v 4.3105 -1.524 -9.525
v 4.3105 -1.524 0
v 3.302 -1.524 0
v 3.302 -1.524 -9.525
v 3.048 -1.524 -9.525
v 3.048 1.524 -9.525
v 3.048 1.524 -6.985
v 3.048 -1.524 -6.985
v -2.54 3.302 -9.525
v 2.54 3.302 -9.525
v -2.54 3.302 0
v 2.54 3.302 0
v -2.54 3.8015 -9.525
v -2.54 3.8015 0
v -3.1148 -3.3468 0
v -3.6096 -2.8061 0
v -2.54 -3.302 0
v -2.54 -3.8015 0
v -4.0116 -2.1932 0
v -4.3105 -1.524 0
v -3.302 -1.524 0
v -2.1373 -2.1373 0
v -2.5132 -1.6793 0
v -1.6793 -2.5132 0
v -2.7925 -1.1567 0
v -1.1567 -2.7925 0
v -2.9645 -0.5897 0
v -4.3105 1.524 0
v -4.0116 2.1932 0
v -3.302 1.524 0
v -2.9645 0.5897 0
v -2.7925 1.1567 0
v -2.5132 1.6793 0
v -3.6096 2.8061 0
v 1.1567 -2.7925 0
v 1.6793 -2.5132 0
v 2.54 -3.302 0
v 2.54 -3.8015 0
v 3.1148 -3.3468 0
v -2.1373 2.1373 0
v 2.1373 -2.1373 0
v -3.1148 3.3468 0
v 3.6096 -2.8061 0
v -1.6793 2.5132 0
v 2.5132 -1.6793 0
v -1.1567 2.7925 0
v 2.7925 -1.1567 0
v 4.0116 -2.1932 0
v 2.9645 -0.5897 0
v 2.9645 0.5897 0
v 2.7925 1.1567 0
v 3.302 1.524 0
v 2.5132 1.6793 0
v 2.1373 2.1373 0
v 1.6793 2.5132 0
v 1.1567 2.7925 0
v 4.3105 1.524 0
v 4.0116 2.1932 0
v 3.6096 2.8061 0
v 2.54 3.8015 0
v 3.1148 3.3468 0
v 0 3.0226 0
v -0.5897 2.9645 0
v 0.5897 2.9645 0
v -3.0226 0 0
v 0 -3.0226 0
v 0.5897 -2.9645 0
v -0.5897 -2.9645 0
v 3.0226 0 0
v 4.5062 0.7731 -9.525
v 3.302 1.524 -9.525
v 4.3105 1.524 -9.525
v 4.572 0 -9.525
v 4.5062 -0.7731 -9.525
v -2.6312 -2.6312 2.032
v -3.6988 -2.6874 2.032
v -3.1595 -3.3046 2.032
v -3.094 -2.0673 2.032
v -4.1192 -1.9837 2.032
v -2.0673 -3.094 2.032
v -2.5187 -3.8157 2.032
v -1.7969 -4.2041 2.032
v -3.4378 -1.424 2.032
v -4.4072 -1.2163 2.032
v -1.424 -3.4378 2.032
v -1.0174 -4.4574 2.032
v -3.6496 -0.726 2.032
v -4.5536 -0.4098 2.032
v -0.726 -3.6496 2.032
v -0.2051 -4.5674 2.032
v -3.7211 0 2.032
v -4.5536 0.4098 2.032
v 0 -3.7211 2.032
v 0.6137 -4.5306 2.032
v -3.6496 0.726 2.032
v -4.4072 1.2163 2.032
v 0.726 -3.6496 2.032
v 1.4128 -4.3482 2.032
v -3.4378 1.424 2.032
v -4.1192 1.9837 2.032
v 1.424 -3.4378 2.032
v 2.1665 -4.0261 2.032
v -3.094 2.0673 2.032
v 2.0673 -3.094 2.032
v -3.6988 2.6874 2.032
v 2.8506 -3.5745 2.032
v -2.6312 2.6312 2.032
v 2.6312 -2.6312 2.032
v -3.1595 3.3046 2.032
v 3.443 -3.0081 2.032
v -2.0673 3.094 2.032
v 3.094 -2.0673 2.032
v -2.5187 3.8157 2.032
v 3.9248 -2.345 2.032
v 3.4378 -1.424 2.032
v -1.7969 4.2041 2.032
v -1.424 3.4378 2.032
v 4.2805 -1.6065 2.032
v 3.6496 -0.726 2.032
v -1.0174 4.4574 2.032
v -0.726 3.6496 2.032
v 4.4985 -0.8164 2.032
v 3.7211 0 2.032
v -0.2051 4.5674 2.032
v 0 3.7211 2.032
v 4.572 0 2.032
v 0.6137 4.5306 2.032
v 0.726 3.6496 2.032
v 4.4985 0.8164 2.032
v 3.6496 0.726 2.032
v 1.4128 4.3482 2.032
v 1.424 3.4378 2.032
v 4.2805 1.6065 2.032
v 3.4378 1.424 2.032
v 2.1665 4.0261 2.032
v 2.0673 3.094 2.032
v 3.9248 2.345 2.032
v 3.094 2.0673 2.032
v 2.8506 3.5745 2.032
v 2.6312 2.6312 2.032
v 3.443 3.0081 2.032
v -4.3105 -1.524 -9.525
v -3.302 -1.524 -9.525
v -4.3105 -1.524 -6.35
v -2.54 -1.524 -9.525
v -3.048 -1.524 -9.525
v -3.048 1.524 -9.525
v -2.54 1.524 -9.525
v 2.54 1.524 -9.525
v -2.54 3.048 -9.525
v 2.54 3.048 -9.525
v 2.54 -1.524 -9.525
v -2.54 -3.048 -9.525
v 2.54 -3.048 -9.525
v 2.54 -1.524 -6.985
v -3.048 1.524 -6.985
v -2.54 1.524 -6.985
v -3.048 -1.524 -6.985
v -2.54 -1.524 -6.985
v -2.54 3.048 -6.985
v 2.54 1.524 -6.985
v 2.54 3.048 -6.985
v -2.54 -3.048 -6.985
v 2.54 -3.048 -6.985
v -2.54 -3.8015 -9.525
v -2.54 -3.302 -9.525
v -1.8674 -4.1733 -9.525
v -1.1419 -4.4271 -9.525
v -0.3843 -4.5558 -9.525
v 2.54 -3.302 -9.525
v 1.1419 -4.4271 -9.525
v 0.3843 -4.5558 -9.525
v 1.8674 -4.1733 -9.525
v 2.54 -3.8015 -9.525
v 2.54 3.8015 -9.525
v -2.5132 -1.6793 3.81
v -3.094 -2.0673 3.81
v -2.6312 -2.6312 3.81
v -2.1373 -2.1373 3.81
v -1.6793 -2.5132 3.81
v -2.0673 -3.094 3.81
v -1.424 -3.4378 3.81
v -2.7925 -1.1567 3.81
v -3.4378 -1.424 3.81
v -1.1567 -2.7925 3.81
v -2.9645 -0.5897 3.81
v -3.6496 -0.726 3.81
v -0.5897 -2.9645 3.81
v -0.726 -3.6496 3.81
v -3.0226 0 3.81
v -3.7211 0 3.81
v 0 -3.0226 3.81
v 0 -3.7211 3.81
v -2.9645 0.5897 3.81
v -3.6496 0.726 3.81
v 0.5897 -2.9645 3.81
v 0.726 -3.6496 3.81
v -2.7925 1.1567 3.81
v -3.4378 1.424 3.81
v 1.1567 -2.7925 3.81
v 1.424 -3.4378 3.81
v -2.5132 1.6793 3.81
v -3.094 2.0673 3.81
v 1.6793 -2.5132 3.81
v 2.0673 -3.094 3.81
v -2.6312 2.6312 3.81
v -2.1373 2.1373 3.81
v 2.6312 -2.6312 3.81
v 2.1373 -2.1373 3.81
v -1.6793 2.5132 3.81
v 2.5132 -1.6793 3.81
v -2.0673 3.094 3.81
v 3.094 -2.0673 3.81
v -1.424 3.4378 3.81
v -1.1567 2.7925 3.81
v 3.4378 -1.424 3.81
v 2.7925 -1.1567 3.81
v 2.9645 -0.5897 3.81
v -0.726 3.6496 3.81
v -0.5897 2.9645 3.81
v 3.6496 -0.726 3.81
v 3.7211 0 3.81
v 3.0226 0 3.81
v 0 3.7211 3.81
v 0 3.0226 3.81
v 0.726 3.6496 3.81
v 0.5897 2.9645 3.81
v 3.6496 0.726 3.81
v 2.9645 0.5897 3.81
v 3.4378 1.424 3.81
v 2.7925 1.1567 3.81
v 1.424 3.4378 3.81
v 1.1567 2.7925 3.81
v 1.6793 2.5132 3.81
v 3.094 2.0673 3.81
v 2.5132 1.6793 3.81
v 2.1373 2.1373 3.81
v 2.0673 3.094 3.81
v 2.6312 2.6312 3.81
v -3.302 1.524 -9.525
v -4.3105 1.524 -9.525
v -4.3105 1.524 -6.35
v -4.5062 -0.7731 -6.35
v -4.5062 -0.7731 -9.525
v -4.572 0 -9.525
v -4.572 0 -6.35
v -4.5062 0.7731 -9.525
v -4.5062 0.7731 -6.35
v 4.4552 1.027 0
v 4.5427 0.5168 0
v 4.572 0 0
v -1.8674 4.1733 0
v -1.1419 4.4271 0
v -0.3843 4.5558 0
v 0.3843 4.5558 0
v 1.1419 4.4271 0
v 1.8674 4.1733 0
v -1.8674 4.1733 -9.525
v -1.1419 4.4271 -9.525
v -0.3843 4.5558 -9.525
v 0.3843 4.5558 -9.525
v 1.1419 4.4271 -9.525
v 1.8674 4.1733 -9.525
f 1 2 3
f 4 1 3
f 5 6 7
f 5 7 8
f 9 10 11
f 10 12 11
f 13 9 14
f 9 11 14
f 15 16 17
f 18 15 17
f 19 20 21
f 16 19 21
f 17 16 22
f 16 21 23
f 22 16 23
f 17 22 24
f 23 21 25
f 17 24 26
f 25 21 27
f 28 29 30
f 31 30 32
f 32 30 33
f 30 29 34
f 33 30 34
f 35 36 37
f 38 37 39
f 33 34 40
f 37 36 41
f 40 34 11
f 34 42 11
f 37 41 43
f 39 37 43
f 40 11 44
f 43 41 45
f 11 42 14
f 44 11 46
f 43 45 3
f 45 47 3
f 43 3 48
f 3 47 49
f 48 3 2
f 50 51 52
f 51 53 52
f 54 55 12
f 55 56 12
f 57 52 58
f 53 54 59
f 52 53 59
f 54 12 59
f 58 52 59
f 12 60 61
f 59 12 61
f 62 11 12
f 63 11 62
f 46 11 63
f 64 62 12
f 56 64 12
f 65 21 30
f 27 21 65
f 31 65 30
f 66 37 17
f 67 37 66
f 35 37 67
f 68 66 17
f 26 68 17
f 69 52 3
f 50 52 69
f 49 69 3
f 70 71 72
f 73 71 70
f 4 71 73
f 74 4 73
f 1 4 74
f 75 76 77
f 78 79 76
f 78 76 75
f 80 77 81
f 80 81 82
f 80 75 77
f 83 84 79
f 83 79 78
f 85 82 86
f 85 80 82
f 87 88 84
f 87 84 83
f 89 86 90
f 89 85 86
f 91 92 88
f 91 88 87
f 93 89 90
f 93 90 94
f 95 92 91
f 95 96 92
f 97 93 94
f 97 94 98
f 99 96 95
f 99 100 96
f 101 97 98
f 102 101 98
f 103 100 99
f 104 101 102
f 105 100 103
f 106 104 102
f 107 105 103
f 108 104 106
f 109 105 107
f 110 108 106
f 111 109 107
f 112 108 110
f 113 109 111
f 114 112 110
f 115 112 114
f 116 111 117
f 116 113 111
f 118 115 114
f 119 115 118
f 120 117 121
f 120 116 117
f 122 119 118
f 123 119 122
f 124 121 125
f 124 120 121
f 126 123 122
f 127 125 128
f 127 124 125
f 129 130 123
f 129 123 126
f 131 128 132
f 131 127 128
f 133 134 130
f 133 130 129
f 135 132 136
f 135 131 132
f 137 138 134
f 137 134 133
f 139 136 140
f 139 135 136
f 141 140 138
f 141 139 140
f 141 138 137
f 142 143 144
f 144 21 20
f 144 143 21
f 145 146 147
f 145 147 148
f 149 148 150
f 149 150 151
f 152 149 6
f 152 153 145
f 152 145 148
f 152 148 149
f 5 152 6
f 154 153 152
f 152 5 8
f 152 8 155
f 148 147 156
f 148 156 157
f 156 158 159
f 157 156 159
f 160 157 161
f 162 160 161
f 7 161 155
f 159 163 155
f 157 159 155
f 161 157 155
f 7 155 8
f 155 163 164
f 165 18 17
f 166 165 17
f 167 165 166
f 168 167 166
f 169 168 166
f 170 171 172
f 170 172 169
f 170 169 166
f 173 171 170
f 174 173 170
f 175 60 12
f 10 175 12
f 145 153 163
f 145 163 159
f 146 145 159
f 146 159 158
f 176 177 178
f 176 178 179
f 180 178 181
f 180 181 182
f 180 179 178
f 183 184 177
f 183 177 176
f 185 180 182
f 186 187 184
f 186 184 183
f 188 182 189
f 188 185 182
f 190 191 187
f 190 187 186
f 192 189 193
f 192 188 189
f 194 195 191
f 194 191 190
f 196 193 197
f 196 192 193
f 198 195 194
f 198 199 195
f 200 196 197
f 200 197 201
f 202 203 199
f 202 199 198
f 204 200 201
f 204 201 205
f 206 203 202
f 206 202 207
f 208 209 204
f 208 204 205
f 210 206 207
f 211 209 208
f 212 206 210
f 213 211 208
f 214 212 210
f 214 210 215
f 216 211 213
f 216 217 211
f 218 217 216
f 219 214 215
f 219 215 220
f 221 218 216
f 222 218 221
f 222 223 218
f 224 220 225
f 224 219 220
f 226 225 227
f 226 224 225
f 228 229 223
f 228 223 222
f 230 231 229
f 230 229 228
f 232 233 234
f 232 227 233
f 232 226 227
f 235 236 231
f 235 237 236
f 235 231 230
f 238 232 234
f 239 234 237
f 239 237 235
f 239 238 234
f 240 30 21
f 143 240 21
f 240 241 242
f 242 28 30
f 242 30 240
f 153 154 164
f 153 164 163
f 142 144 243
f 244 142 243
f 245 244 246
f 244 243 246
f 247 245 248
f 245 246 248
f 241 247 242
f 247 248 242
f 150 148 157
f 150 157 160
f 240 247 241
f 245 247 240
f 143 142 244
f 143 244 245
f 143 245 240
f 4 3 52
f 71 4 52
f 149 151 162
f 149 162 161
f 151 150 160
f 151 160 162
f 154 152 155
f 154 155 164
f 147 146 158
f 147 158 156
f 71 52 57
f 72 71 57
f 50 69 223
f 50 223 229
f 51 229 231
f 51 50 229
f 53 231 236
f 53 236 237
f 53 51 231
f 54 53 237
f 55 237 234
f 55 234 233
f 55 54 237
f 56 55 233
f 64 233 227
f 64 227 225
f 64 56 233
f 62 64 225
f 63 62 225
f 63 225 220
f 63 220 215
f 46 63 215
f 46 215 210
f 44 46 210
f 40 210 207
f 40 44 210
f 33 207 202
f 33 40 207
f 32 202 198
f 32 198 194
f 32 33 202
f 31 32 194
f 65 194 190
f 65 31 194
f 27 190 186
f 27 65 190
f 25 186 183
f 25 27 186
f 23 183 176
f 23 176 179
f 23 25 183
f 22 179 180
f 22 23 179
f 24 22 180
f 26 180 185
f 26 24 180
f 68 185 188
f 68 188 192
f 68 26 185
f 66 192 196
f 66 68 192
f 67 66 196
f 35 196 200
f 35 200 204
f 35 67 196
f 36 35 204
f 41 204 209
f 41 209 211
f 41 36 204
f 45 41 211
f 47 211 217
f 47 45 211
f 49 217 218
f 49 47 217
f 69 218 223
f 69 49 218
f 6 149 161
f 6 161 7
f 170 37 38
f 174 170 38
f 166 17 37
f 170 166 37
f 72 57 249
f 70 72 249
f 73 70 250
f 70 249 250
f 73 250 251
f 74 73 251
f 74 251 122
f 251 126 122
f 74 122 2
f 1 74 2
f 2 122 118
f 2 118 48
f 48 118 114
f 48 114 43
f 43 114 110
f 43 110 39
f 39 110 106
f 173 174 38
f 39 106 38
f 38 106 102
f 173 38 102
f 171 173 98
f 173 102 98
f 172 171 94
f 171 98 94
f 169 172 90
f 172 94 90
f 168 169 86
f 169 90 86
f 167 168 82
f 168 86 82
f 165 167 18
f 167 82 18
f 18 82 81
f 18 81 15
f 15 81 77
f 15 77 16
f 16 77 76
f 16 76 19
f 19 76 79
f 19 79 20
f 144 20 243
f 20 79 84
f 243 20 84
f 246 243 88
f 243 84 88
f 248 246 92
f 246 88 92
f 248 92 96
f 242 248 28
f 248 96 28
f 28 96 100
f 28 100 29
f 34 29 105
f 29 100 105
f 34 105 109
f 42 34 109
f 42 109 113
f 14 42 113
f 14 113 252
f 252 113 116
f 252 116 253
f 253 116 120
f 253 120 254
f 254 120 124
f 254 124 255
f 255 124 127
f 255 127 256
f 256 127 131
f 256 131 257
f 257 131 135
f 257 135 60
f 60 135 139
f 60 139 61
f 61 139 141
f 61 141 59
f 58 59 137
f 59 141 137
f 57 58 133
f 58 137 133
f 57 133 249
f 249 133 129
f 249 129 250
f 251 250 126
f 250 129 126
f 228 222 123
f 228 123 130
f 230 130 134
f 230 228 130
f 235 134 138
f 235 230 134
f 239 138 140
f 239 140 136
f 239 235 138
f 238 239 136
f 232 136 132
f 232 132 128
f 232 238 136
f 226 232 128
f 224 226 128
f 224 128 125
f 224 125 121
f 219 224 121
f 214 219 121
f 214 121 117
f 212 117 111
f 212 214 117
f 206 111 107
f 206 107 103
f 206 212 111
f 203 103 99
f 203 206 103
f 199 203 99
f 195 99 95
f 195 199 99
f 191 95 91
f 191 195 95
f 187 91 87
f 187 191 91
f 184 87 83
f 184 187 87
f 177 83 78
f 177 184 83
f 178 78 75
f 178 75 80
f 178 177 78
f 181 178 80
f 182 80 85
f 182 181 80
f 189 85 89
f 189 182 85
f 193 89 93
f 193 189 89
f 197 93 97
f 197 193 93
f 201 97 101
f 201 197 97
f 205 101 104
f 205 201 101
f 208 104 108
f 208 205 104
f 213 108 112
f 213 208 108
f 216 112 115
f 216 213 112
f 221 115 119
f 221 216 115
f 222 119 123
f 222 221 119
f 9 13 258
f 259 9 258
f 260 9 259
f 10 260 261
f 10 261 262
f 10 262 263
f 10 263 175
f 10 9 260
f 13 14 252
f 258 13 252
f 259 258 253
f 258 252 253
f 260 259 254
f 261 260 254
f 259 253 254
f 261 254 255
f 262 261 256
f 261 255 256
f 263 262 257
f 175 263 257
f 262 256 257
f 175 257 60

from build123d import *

# Parameters (mm, degrees)
F0_R      = 4.572
F0_R_2    = 3.0226
F1_DEPTH  = 3.81
F2_R      = 4.572
F2_R_2    = 3.7211
F3_DEPTH  = 1.778
F5_DEPTH  = 6.35
F6_DEPTH  = 3.175
F8_DEPTH  = 2.54
F11_DEPTH = 6.35
F13_DEPTH = 3.175
F14_R     = 4.8244158916
F15_DEPTH = 3.175


# Not quite as in the source:
# - after a boolean that leaves OpenCascade's solid faulty, fix() repairs it


with BuildPart() as f1:
    # F0 (on Top) → F1 (new body)
    with BuildSketch(Plane.XY):
        Circle(F0_R)
        Circle(F0_R_2, mode=Mode.SUBTRACT)
    extrude(amount=F1_DEPTH)

    # F2 (on face) → F3 (cut)
    with BuildSketch(Plane.XY.offset(3.81)):
        Circle(F2_R)
        Circle(F2_R_2, mode=Mode.SUBTRACT)
    extrude(amount=-F3_DEPTH, mode=Mode.SUBTRACT)

    # F4 (on face) → F5 (join)
    with BuildSketch(Plane(origin=(0, 0, 0), x_dir=(1, 0, 0), z_dir=(0, 0, -1))):
        with BuildLine():
            Line((-3.302, 1.524), (-4.3105229381, 1.524))
            ThreePointArc((-4.3105229381, 1.524), (-4.572, 0), (-4.3105229381, -1.524))
            Line((-4.3105229381, -1.524), (-3.302, -1.524))
            Line((-3.302, -1.524), (-3.302, 1.524))
        make_face()
        with BuildLine():
            Line((-2.54, 3.302), (2.54, 3.302))
            Line((2.54, 3.302), (2.54, 3.801523905))
            ThreePointArc((2.54, 3.801523905), (0, 4.572), (-2.54, 3.801523905))
            Line((-2.54, 3.801523905), (-2.54, 3.302))
        make_face()
        with BuildLine():
            Line((4.3105229381, 1.524), (3.302, 1.524))
            Line((3.302, 1.524), (3.302, -1.524))
            Line((3.302, -1.524), (4.3105229381, -1.524))
            ThreePointArc((4.3105229381, -1.524), (4.572, 0), (4.3105229381, 1.524))
        make_face()
        with BuildLine():
            Line((2.54, -3.801523905), (2.54, -3.302))
            Line((2.54, -3.302), (-2.54, -3.302))
            Line((-2.54, -3.302), (-2.54, -3.801523905))
            ThreePointArc((-2.54, -3.801523905), (0, -4.572), (2.54, -3.801523905))
        make_face()
    extrude(amount=F5_DEPTH)

    add(f1.part.fix(), mode=Mode.REPLACE)

    # F6 (add): faces of the model
    f6_faces = [f1.faces().sort_by_distance(p)[0] for p in [
        (0, 3.838335495, -6.35),
        (0, -3.838335495, -6.35),
        (-3.8964762164, 0, -6.35),
        (3.8964762164, 0, -6.35),
    ]]
    extrude(f6_faces, amount=F6_DEPTH)


with BuildPart() as f8:
    # F7 (on face) → F8 (new body)
    with BuildSketch(Plane(origin=(0, 0, -9.525), x_dir=(1, 0, 0), z_dir=(0, 0, -1))):
        Polygon((-2.54, 1.524), (-3.048, 1.524), (-3.048, -1.524), (-2.54, -1.524), (-2.54, -3.048), (2.54, -3.048), (2.54, -1.524), (3.048, -1.524), (3.048, 1.524), (2.54, 1.524), (2.54, 3.048), (-2.54, 3.048), align=None)
    extrude(amount=-F8_DEPTH)


with BuildPart() as f11:
    # F10 (on offset) → F11 (new body)
    with BuildSketch(Plane.XY.offset(-25.4)):
        with BuildLine():
            Line((-6.5659403285, 8.1975422484), (-4.0371337642, 3.8175207966))
            ThreePointArc((-4.0371337642, 3.8175207966), (-5.55625, 0), (-4.0371337642, -3.8175207966))
            Line((-4.0371337642, -3.8175207966), (-6.5659403285, -8.1975422484))
            Line((-6.5659403285, -8.1975422484), (-3.8163096715, -9.7850422484))
            Line((-3.8163096715, -9.7850422484), (-1.2875031072, -5.4050207966))
            ThreePointArc((-1.2875031072, -5.4050207966), (2.778125, -4.8118536498), (5.3246368714, -1.5875))
            Line((5.3246368714, -1.5875), (10.38225, -1.5875))
            Line((10.38225, -1.5875), (10.38225, 1.5875))
            Line((10.38225, 1.5875), (5.3246368714, 1.5875))
            ThreePointArc((5.3246368714, 1.5875), (2.778125, 4.8118536498), (-1.2875031072, 5.4050207966))
            Line((-1.2875031072, 5.4050207966), (-3.8163096715, 9.7850422484))
            Line((-3.8163096715, 9.7850422484), (-6.5659403285, 8.1975422484))
        make_face()
        with BuildLine():
            ThreePointArc((2.794, -3.9330080976), (0, -4.8244158916), (-2.794, -3.9330080976))
            Line((-2.794, -3.9330080976), (-2.794, -2.794))
            Line((-2.794, -2.794), (2.794, -2.794))
            Line((2.794, -2.794), (2.794, -3.9330080976))
        make_face(mode=Mode.SUBTRACT)
        with BuildLine():
            Line((-4.4850030606, 1.7775646942), (-2.7929016728, 1.7775646942))
            Line((-2.7929016728, 1.7775646942), (-2.7929016728, -1.7775646942))
            Line((-2.7929016728, -1.7775646942), (-4.4850030606, -1.7775646942))
            ThreePointArc((-4.4850030606, -1.7775646942), (-4.8244158916, 0), (-4.4850030606, 1.7775646942))
        make_face(mode=Mode.SUBTRACT)
        with BuildLine():
            Line((2.794, 2.794), (-2.794, 2.794))
            Line((-2.794, 2.794), (-2.794, 3.9330080976))
            ThreePointArc((-2.794, 3.9330080976), (0, 4.8244158916), (2.794, 3.9330080976))
            Line((2.794, 3.9330080976), (2.794, 2.794))
        make_face(mode=Mode.SUBTRACT)
        with BuildLine():
            Line((4.4850030606, -1.7775646942), (2.7929016728, -1.7775646942))
            Line((2.7929016728, -1.7775646942), (2.7929016728, 1.7775646942))
            Line((2.7929016728, 1.7775646942), (4.4850030606, 1.7775646942))
            ThreePointArc((4.4850030606, 1.7775646942), (4.8244158916, 0), (4.4850030606, -1.7775646942))
        make_face(mode=Mode.SUBTRACT)
    extrude(amount=F11_DEPTH)

    # F12 (on face) → F13 (join)
    with BuildSketch(Plane.XY.offset(-19.05)):
        with BuildLine():
            Line((10.38225, -1.5875), (10.38225, 1.5875))
            Line((10.38225, 1.5875), (5.3246368714, 1.5875))
            ThreePointArc((5.3246368714, 1.5875), (2.778125, 4.8118536498), (-1.2875031072, 5.4050207966))
            Line((-1.2875031072, 5.4050207966), (-3.8163096715, 9.7850422484))
            Line((-3.8163096715, 9.7850422484), (-6.5659403285, 8.1975422484))
            Line((-6.5659403285, 8.1975422484), (-4.0371337642, 3.8175207966))
            ThreePointArc((-4.0371337642, 3.8175207966), (-5.55625, 0), (-4.0371337642, -3.8175207966))
            Line((-4.0371337642, -3.8175207966), (-6.5659403285, -8.1975422484))
            Line((-6.5659403285, -8.1975422484), (-3.8163096715, -9.7850422484))
            Line((-3.8163096715, -9.7850422484), (-1.2875031072, -5.4050207966))
            ThreePointArc((-1.2875031072, -5.4050207966), (2.778125, -4.8118536498), (5.3246368714, -1.5875))
            Line((5.3246368714, -1.5875), (10.38225, -1.5875))
        make_face()
        with BuildLine():
            ThreePointArc((3.9330080976, -2.794), (0, -4.8244158916), (-3.9330080976, -2.794))
            Line((-3.9330080976, -2.794), (3.9330080976, -2.794))
        make_face(mode=Mode.SUBTRACT)
        with BuildLine():
            Line((4.4850030606, -1.7775646942), (-4.4850030606, -1.7775646942))
            ThreePointArc((-4.4850030606, -1.7775646942), (-4.8244158916, 0), (-4.4850030606, 1.7775646942))
            Line((-4.4850030606, 1.7775646942), (4.4850030606, 1.7775646942))
            ThreePointArc((4.4850030606, 1.7775646942), (4.8244158916, 0), (4.4850030606, -1.7775646942))
        make_face(mode=Mode.SUBTRACT)
        with BuildLine():
            Line((3.9330080976, 2.794), (-3.9330080976, 2.794))
            ThreePointArc((-3.9330080976, 2.794), (0, 4.8244158916), (3.9330080976, 2.794))
        make_face(mode=Mode.SUBTRACT)
    extrude(amount=F13_DEPTH)

    # F14 (on face) → F15 (join)
    with BuildSketch(Plane.XY.offset(-15.875)):
        with BuildLine():
            Line((10.38225, -1.5875), (10.38225, 1.5875))
            Line((10.38225, 1.5875), (5.3246368714, 1.5875))
            ThreePointArc((5.3246368714, 1.5875), (2.778125, 4.8118536498), (-1.2875031072, 5.4050207966))
            Line((-1.2875031072, 5.4050207966), (-3.8163096715, 9.7850422484))
            Line((-3.8163096715, 9.7850422484), (-6.5659403285, 8.1975422484))
            Line((-6.5659403285, 8.1975422484), (-4.0371337642, 3.8175207966))
            ThreePointArc((-4.0371337642, 3.8175207966), (-5.55625, 0), (-4.0371337642, -3.8175207966))
            Line((-4.0371337642, -3.8175207966), (-6.5659403285, -8.1975422484))
            Line((-6.5659403285, -8.1975422484), (-3.8163096715, -9.7850422484))
            Line((-3.8163096715, -9.7850422484), (-1.2875031072, -5.4050207966))
            ThreePointArc((-1.2875031072, -5.4050207966), (2.778125, -4.8118536498), (5.3246368714, -1.5875))
            Line((5.3246368714, -1.5875), (10.38225, -1.5875))
        make_face()
        Circle(F14_R, mode=Mode.SUBTRACT)
    extrude(amount=F15_DEPTH)


solid = Compound([f1.part, f8.part])
